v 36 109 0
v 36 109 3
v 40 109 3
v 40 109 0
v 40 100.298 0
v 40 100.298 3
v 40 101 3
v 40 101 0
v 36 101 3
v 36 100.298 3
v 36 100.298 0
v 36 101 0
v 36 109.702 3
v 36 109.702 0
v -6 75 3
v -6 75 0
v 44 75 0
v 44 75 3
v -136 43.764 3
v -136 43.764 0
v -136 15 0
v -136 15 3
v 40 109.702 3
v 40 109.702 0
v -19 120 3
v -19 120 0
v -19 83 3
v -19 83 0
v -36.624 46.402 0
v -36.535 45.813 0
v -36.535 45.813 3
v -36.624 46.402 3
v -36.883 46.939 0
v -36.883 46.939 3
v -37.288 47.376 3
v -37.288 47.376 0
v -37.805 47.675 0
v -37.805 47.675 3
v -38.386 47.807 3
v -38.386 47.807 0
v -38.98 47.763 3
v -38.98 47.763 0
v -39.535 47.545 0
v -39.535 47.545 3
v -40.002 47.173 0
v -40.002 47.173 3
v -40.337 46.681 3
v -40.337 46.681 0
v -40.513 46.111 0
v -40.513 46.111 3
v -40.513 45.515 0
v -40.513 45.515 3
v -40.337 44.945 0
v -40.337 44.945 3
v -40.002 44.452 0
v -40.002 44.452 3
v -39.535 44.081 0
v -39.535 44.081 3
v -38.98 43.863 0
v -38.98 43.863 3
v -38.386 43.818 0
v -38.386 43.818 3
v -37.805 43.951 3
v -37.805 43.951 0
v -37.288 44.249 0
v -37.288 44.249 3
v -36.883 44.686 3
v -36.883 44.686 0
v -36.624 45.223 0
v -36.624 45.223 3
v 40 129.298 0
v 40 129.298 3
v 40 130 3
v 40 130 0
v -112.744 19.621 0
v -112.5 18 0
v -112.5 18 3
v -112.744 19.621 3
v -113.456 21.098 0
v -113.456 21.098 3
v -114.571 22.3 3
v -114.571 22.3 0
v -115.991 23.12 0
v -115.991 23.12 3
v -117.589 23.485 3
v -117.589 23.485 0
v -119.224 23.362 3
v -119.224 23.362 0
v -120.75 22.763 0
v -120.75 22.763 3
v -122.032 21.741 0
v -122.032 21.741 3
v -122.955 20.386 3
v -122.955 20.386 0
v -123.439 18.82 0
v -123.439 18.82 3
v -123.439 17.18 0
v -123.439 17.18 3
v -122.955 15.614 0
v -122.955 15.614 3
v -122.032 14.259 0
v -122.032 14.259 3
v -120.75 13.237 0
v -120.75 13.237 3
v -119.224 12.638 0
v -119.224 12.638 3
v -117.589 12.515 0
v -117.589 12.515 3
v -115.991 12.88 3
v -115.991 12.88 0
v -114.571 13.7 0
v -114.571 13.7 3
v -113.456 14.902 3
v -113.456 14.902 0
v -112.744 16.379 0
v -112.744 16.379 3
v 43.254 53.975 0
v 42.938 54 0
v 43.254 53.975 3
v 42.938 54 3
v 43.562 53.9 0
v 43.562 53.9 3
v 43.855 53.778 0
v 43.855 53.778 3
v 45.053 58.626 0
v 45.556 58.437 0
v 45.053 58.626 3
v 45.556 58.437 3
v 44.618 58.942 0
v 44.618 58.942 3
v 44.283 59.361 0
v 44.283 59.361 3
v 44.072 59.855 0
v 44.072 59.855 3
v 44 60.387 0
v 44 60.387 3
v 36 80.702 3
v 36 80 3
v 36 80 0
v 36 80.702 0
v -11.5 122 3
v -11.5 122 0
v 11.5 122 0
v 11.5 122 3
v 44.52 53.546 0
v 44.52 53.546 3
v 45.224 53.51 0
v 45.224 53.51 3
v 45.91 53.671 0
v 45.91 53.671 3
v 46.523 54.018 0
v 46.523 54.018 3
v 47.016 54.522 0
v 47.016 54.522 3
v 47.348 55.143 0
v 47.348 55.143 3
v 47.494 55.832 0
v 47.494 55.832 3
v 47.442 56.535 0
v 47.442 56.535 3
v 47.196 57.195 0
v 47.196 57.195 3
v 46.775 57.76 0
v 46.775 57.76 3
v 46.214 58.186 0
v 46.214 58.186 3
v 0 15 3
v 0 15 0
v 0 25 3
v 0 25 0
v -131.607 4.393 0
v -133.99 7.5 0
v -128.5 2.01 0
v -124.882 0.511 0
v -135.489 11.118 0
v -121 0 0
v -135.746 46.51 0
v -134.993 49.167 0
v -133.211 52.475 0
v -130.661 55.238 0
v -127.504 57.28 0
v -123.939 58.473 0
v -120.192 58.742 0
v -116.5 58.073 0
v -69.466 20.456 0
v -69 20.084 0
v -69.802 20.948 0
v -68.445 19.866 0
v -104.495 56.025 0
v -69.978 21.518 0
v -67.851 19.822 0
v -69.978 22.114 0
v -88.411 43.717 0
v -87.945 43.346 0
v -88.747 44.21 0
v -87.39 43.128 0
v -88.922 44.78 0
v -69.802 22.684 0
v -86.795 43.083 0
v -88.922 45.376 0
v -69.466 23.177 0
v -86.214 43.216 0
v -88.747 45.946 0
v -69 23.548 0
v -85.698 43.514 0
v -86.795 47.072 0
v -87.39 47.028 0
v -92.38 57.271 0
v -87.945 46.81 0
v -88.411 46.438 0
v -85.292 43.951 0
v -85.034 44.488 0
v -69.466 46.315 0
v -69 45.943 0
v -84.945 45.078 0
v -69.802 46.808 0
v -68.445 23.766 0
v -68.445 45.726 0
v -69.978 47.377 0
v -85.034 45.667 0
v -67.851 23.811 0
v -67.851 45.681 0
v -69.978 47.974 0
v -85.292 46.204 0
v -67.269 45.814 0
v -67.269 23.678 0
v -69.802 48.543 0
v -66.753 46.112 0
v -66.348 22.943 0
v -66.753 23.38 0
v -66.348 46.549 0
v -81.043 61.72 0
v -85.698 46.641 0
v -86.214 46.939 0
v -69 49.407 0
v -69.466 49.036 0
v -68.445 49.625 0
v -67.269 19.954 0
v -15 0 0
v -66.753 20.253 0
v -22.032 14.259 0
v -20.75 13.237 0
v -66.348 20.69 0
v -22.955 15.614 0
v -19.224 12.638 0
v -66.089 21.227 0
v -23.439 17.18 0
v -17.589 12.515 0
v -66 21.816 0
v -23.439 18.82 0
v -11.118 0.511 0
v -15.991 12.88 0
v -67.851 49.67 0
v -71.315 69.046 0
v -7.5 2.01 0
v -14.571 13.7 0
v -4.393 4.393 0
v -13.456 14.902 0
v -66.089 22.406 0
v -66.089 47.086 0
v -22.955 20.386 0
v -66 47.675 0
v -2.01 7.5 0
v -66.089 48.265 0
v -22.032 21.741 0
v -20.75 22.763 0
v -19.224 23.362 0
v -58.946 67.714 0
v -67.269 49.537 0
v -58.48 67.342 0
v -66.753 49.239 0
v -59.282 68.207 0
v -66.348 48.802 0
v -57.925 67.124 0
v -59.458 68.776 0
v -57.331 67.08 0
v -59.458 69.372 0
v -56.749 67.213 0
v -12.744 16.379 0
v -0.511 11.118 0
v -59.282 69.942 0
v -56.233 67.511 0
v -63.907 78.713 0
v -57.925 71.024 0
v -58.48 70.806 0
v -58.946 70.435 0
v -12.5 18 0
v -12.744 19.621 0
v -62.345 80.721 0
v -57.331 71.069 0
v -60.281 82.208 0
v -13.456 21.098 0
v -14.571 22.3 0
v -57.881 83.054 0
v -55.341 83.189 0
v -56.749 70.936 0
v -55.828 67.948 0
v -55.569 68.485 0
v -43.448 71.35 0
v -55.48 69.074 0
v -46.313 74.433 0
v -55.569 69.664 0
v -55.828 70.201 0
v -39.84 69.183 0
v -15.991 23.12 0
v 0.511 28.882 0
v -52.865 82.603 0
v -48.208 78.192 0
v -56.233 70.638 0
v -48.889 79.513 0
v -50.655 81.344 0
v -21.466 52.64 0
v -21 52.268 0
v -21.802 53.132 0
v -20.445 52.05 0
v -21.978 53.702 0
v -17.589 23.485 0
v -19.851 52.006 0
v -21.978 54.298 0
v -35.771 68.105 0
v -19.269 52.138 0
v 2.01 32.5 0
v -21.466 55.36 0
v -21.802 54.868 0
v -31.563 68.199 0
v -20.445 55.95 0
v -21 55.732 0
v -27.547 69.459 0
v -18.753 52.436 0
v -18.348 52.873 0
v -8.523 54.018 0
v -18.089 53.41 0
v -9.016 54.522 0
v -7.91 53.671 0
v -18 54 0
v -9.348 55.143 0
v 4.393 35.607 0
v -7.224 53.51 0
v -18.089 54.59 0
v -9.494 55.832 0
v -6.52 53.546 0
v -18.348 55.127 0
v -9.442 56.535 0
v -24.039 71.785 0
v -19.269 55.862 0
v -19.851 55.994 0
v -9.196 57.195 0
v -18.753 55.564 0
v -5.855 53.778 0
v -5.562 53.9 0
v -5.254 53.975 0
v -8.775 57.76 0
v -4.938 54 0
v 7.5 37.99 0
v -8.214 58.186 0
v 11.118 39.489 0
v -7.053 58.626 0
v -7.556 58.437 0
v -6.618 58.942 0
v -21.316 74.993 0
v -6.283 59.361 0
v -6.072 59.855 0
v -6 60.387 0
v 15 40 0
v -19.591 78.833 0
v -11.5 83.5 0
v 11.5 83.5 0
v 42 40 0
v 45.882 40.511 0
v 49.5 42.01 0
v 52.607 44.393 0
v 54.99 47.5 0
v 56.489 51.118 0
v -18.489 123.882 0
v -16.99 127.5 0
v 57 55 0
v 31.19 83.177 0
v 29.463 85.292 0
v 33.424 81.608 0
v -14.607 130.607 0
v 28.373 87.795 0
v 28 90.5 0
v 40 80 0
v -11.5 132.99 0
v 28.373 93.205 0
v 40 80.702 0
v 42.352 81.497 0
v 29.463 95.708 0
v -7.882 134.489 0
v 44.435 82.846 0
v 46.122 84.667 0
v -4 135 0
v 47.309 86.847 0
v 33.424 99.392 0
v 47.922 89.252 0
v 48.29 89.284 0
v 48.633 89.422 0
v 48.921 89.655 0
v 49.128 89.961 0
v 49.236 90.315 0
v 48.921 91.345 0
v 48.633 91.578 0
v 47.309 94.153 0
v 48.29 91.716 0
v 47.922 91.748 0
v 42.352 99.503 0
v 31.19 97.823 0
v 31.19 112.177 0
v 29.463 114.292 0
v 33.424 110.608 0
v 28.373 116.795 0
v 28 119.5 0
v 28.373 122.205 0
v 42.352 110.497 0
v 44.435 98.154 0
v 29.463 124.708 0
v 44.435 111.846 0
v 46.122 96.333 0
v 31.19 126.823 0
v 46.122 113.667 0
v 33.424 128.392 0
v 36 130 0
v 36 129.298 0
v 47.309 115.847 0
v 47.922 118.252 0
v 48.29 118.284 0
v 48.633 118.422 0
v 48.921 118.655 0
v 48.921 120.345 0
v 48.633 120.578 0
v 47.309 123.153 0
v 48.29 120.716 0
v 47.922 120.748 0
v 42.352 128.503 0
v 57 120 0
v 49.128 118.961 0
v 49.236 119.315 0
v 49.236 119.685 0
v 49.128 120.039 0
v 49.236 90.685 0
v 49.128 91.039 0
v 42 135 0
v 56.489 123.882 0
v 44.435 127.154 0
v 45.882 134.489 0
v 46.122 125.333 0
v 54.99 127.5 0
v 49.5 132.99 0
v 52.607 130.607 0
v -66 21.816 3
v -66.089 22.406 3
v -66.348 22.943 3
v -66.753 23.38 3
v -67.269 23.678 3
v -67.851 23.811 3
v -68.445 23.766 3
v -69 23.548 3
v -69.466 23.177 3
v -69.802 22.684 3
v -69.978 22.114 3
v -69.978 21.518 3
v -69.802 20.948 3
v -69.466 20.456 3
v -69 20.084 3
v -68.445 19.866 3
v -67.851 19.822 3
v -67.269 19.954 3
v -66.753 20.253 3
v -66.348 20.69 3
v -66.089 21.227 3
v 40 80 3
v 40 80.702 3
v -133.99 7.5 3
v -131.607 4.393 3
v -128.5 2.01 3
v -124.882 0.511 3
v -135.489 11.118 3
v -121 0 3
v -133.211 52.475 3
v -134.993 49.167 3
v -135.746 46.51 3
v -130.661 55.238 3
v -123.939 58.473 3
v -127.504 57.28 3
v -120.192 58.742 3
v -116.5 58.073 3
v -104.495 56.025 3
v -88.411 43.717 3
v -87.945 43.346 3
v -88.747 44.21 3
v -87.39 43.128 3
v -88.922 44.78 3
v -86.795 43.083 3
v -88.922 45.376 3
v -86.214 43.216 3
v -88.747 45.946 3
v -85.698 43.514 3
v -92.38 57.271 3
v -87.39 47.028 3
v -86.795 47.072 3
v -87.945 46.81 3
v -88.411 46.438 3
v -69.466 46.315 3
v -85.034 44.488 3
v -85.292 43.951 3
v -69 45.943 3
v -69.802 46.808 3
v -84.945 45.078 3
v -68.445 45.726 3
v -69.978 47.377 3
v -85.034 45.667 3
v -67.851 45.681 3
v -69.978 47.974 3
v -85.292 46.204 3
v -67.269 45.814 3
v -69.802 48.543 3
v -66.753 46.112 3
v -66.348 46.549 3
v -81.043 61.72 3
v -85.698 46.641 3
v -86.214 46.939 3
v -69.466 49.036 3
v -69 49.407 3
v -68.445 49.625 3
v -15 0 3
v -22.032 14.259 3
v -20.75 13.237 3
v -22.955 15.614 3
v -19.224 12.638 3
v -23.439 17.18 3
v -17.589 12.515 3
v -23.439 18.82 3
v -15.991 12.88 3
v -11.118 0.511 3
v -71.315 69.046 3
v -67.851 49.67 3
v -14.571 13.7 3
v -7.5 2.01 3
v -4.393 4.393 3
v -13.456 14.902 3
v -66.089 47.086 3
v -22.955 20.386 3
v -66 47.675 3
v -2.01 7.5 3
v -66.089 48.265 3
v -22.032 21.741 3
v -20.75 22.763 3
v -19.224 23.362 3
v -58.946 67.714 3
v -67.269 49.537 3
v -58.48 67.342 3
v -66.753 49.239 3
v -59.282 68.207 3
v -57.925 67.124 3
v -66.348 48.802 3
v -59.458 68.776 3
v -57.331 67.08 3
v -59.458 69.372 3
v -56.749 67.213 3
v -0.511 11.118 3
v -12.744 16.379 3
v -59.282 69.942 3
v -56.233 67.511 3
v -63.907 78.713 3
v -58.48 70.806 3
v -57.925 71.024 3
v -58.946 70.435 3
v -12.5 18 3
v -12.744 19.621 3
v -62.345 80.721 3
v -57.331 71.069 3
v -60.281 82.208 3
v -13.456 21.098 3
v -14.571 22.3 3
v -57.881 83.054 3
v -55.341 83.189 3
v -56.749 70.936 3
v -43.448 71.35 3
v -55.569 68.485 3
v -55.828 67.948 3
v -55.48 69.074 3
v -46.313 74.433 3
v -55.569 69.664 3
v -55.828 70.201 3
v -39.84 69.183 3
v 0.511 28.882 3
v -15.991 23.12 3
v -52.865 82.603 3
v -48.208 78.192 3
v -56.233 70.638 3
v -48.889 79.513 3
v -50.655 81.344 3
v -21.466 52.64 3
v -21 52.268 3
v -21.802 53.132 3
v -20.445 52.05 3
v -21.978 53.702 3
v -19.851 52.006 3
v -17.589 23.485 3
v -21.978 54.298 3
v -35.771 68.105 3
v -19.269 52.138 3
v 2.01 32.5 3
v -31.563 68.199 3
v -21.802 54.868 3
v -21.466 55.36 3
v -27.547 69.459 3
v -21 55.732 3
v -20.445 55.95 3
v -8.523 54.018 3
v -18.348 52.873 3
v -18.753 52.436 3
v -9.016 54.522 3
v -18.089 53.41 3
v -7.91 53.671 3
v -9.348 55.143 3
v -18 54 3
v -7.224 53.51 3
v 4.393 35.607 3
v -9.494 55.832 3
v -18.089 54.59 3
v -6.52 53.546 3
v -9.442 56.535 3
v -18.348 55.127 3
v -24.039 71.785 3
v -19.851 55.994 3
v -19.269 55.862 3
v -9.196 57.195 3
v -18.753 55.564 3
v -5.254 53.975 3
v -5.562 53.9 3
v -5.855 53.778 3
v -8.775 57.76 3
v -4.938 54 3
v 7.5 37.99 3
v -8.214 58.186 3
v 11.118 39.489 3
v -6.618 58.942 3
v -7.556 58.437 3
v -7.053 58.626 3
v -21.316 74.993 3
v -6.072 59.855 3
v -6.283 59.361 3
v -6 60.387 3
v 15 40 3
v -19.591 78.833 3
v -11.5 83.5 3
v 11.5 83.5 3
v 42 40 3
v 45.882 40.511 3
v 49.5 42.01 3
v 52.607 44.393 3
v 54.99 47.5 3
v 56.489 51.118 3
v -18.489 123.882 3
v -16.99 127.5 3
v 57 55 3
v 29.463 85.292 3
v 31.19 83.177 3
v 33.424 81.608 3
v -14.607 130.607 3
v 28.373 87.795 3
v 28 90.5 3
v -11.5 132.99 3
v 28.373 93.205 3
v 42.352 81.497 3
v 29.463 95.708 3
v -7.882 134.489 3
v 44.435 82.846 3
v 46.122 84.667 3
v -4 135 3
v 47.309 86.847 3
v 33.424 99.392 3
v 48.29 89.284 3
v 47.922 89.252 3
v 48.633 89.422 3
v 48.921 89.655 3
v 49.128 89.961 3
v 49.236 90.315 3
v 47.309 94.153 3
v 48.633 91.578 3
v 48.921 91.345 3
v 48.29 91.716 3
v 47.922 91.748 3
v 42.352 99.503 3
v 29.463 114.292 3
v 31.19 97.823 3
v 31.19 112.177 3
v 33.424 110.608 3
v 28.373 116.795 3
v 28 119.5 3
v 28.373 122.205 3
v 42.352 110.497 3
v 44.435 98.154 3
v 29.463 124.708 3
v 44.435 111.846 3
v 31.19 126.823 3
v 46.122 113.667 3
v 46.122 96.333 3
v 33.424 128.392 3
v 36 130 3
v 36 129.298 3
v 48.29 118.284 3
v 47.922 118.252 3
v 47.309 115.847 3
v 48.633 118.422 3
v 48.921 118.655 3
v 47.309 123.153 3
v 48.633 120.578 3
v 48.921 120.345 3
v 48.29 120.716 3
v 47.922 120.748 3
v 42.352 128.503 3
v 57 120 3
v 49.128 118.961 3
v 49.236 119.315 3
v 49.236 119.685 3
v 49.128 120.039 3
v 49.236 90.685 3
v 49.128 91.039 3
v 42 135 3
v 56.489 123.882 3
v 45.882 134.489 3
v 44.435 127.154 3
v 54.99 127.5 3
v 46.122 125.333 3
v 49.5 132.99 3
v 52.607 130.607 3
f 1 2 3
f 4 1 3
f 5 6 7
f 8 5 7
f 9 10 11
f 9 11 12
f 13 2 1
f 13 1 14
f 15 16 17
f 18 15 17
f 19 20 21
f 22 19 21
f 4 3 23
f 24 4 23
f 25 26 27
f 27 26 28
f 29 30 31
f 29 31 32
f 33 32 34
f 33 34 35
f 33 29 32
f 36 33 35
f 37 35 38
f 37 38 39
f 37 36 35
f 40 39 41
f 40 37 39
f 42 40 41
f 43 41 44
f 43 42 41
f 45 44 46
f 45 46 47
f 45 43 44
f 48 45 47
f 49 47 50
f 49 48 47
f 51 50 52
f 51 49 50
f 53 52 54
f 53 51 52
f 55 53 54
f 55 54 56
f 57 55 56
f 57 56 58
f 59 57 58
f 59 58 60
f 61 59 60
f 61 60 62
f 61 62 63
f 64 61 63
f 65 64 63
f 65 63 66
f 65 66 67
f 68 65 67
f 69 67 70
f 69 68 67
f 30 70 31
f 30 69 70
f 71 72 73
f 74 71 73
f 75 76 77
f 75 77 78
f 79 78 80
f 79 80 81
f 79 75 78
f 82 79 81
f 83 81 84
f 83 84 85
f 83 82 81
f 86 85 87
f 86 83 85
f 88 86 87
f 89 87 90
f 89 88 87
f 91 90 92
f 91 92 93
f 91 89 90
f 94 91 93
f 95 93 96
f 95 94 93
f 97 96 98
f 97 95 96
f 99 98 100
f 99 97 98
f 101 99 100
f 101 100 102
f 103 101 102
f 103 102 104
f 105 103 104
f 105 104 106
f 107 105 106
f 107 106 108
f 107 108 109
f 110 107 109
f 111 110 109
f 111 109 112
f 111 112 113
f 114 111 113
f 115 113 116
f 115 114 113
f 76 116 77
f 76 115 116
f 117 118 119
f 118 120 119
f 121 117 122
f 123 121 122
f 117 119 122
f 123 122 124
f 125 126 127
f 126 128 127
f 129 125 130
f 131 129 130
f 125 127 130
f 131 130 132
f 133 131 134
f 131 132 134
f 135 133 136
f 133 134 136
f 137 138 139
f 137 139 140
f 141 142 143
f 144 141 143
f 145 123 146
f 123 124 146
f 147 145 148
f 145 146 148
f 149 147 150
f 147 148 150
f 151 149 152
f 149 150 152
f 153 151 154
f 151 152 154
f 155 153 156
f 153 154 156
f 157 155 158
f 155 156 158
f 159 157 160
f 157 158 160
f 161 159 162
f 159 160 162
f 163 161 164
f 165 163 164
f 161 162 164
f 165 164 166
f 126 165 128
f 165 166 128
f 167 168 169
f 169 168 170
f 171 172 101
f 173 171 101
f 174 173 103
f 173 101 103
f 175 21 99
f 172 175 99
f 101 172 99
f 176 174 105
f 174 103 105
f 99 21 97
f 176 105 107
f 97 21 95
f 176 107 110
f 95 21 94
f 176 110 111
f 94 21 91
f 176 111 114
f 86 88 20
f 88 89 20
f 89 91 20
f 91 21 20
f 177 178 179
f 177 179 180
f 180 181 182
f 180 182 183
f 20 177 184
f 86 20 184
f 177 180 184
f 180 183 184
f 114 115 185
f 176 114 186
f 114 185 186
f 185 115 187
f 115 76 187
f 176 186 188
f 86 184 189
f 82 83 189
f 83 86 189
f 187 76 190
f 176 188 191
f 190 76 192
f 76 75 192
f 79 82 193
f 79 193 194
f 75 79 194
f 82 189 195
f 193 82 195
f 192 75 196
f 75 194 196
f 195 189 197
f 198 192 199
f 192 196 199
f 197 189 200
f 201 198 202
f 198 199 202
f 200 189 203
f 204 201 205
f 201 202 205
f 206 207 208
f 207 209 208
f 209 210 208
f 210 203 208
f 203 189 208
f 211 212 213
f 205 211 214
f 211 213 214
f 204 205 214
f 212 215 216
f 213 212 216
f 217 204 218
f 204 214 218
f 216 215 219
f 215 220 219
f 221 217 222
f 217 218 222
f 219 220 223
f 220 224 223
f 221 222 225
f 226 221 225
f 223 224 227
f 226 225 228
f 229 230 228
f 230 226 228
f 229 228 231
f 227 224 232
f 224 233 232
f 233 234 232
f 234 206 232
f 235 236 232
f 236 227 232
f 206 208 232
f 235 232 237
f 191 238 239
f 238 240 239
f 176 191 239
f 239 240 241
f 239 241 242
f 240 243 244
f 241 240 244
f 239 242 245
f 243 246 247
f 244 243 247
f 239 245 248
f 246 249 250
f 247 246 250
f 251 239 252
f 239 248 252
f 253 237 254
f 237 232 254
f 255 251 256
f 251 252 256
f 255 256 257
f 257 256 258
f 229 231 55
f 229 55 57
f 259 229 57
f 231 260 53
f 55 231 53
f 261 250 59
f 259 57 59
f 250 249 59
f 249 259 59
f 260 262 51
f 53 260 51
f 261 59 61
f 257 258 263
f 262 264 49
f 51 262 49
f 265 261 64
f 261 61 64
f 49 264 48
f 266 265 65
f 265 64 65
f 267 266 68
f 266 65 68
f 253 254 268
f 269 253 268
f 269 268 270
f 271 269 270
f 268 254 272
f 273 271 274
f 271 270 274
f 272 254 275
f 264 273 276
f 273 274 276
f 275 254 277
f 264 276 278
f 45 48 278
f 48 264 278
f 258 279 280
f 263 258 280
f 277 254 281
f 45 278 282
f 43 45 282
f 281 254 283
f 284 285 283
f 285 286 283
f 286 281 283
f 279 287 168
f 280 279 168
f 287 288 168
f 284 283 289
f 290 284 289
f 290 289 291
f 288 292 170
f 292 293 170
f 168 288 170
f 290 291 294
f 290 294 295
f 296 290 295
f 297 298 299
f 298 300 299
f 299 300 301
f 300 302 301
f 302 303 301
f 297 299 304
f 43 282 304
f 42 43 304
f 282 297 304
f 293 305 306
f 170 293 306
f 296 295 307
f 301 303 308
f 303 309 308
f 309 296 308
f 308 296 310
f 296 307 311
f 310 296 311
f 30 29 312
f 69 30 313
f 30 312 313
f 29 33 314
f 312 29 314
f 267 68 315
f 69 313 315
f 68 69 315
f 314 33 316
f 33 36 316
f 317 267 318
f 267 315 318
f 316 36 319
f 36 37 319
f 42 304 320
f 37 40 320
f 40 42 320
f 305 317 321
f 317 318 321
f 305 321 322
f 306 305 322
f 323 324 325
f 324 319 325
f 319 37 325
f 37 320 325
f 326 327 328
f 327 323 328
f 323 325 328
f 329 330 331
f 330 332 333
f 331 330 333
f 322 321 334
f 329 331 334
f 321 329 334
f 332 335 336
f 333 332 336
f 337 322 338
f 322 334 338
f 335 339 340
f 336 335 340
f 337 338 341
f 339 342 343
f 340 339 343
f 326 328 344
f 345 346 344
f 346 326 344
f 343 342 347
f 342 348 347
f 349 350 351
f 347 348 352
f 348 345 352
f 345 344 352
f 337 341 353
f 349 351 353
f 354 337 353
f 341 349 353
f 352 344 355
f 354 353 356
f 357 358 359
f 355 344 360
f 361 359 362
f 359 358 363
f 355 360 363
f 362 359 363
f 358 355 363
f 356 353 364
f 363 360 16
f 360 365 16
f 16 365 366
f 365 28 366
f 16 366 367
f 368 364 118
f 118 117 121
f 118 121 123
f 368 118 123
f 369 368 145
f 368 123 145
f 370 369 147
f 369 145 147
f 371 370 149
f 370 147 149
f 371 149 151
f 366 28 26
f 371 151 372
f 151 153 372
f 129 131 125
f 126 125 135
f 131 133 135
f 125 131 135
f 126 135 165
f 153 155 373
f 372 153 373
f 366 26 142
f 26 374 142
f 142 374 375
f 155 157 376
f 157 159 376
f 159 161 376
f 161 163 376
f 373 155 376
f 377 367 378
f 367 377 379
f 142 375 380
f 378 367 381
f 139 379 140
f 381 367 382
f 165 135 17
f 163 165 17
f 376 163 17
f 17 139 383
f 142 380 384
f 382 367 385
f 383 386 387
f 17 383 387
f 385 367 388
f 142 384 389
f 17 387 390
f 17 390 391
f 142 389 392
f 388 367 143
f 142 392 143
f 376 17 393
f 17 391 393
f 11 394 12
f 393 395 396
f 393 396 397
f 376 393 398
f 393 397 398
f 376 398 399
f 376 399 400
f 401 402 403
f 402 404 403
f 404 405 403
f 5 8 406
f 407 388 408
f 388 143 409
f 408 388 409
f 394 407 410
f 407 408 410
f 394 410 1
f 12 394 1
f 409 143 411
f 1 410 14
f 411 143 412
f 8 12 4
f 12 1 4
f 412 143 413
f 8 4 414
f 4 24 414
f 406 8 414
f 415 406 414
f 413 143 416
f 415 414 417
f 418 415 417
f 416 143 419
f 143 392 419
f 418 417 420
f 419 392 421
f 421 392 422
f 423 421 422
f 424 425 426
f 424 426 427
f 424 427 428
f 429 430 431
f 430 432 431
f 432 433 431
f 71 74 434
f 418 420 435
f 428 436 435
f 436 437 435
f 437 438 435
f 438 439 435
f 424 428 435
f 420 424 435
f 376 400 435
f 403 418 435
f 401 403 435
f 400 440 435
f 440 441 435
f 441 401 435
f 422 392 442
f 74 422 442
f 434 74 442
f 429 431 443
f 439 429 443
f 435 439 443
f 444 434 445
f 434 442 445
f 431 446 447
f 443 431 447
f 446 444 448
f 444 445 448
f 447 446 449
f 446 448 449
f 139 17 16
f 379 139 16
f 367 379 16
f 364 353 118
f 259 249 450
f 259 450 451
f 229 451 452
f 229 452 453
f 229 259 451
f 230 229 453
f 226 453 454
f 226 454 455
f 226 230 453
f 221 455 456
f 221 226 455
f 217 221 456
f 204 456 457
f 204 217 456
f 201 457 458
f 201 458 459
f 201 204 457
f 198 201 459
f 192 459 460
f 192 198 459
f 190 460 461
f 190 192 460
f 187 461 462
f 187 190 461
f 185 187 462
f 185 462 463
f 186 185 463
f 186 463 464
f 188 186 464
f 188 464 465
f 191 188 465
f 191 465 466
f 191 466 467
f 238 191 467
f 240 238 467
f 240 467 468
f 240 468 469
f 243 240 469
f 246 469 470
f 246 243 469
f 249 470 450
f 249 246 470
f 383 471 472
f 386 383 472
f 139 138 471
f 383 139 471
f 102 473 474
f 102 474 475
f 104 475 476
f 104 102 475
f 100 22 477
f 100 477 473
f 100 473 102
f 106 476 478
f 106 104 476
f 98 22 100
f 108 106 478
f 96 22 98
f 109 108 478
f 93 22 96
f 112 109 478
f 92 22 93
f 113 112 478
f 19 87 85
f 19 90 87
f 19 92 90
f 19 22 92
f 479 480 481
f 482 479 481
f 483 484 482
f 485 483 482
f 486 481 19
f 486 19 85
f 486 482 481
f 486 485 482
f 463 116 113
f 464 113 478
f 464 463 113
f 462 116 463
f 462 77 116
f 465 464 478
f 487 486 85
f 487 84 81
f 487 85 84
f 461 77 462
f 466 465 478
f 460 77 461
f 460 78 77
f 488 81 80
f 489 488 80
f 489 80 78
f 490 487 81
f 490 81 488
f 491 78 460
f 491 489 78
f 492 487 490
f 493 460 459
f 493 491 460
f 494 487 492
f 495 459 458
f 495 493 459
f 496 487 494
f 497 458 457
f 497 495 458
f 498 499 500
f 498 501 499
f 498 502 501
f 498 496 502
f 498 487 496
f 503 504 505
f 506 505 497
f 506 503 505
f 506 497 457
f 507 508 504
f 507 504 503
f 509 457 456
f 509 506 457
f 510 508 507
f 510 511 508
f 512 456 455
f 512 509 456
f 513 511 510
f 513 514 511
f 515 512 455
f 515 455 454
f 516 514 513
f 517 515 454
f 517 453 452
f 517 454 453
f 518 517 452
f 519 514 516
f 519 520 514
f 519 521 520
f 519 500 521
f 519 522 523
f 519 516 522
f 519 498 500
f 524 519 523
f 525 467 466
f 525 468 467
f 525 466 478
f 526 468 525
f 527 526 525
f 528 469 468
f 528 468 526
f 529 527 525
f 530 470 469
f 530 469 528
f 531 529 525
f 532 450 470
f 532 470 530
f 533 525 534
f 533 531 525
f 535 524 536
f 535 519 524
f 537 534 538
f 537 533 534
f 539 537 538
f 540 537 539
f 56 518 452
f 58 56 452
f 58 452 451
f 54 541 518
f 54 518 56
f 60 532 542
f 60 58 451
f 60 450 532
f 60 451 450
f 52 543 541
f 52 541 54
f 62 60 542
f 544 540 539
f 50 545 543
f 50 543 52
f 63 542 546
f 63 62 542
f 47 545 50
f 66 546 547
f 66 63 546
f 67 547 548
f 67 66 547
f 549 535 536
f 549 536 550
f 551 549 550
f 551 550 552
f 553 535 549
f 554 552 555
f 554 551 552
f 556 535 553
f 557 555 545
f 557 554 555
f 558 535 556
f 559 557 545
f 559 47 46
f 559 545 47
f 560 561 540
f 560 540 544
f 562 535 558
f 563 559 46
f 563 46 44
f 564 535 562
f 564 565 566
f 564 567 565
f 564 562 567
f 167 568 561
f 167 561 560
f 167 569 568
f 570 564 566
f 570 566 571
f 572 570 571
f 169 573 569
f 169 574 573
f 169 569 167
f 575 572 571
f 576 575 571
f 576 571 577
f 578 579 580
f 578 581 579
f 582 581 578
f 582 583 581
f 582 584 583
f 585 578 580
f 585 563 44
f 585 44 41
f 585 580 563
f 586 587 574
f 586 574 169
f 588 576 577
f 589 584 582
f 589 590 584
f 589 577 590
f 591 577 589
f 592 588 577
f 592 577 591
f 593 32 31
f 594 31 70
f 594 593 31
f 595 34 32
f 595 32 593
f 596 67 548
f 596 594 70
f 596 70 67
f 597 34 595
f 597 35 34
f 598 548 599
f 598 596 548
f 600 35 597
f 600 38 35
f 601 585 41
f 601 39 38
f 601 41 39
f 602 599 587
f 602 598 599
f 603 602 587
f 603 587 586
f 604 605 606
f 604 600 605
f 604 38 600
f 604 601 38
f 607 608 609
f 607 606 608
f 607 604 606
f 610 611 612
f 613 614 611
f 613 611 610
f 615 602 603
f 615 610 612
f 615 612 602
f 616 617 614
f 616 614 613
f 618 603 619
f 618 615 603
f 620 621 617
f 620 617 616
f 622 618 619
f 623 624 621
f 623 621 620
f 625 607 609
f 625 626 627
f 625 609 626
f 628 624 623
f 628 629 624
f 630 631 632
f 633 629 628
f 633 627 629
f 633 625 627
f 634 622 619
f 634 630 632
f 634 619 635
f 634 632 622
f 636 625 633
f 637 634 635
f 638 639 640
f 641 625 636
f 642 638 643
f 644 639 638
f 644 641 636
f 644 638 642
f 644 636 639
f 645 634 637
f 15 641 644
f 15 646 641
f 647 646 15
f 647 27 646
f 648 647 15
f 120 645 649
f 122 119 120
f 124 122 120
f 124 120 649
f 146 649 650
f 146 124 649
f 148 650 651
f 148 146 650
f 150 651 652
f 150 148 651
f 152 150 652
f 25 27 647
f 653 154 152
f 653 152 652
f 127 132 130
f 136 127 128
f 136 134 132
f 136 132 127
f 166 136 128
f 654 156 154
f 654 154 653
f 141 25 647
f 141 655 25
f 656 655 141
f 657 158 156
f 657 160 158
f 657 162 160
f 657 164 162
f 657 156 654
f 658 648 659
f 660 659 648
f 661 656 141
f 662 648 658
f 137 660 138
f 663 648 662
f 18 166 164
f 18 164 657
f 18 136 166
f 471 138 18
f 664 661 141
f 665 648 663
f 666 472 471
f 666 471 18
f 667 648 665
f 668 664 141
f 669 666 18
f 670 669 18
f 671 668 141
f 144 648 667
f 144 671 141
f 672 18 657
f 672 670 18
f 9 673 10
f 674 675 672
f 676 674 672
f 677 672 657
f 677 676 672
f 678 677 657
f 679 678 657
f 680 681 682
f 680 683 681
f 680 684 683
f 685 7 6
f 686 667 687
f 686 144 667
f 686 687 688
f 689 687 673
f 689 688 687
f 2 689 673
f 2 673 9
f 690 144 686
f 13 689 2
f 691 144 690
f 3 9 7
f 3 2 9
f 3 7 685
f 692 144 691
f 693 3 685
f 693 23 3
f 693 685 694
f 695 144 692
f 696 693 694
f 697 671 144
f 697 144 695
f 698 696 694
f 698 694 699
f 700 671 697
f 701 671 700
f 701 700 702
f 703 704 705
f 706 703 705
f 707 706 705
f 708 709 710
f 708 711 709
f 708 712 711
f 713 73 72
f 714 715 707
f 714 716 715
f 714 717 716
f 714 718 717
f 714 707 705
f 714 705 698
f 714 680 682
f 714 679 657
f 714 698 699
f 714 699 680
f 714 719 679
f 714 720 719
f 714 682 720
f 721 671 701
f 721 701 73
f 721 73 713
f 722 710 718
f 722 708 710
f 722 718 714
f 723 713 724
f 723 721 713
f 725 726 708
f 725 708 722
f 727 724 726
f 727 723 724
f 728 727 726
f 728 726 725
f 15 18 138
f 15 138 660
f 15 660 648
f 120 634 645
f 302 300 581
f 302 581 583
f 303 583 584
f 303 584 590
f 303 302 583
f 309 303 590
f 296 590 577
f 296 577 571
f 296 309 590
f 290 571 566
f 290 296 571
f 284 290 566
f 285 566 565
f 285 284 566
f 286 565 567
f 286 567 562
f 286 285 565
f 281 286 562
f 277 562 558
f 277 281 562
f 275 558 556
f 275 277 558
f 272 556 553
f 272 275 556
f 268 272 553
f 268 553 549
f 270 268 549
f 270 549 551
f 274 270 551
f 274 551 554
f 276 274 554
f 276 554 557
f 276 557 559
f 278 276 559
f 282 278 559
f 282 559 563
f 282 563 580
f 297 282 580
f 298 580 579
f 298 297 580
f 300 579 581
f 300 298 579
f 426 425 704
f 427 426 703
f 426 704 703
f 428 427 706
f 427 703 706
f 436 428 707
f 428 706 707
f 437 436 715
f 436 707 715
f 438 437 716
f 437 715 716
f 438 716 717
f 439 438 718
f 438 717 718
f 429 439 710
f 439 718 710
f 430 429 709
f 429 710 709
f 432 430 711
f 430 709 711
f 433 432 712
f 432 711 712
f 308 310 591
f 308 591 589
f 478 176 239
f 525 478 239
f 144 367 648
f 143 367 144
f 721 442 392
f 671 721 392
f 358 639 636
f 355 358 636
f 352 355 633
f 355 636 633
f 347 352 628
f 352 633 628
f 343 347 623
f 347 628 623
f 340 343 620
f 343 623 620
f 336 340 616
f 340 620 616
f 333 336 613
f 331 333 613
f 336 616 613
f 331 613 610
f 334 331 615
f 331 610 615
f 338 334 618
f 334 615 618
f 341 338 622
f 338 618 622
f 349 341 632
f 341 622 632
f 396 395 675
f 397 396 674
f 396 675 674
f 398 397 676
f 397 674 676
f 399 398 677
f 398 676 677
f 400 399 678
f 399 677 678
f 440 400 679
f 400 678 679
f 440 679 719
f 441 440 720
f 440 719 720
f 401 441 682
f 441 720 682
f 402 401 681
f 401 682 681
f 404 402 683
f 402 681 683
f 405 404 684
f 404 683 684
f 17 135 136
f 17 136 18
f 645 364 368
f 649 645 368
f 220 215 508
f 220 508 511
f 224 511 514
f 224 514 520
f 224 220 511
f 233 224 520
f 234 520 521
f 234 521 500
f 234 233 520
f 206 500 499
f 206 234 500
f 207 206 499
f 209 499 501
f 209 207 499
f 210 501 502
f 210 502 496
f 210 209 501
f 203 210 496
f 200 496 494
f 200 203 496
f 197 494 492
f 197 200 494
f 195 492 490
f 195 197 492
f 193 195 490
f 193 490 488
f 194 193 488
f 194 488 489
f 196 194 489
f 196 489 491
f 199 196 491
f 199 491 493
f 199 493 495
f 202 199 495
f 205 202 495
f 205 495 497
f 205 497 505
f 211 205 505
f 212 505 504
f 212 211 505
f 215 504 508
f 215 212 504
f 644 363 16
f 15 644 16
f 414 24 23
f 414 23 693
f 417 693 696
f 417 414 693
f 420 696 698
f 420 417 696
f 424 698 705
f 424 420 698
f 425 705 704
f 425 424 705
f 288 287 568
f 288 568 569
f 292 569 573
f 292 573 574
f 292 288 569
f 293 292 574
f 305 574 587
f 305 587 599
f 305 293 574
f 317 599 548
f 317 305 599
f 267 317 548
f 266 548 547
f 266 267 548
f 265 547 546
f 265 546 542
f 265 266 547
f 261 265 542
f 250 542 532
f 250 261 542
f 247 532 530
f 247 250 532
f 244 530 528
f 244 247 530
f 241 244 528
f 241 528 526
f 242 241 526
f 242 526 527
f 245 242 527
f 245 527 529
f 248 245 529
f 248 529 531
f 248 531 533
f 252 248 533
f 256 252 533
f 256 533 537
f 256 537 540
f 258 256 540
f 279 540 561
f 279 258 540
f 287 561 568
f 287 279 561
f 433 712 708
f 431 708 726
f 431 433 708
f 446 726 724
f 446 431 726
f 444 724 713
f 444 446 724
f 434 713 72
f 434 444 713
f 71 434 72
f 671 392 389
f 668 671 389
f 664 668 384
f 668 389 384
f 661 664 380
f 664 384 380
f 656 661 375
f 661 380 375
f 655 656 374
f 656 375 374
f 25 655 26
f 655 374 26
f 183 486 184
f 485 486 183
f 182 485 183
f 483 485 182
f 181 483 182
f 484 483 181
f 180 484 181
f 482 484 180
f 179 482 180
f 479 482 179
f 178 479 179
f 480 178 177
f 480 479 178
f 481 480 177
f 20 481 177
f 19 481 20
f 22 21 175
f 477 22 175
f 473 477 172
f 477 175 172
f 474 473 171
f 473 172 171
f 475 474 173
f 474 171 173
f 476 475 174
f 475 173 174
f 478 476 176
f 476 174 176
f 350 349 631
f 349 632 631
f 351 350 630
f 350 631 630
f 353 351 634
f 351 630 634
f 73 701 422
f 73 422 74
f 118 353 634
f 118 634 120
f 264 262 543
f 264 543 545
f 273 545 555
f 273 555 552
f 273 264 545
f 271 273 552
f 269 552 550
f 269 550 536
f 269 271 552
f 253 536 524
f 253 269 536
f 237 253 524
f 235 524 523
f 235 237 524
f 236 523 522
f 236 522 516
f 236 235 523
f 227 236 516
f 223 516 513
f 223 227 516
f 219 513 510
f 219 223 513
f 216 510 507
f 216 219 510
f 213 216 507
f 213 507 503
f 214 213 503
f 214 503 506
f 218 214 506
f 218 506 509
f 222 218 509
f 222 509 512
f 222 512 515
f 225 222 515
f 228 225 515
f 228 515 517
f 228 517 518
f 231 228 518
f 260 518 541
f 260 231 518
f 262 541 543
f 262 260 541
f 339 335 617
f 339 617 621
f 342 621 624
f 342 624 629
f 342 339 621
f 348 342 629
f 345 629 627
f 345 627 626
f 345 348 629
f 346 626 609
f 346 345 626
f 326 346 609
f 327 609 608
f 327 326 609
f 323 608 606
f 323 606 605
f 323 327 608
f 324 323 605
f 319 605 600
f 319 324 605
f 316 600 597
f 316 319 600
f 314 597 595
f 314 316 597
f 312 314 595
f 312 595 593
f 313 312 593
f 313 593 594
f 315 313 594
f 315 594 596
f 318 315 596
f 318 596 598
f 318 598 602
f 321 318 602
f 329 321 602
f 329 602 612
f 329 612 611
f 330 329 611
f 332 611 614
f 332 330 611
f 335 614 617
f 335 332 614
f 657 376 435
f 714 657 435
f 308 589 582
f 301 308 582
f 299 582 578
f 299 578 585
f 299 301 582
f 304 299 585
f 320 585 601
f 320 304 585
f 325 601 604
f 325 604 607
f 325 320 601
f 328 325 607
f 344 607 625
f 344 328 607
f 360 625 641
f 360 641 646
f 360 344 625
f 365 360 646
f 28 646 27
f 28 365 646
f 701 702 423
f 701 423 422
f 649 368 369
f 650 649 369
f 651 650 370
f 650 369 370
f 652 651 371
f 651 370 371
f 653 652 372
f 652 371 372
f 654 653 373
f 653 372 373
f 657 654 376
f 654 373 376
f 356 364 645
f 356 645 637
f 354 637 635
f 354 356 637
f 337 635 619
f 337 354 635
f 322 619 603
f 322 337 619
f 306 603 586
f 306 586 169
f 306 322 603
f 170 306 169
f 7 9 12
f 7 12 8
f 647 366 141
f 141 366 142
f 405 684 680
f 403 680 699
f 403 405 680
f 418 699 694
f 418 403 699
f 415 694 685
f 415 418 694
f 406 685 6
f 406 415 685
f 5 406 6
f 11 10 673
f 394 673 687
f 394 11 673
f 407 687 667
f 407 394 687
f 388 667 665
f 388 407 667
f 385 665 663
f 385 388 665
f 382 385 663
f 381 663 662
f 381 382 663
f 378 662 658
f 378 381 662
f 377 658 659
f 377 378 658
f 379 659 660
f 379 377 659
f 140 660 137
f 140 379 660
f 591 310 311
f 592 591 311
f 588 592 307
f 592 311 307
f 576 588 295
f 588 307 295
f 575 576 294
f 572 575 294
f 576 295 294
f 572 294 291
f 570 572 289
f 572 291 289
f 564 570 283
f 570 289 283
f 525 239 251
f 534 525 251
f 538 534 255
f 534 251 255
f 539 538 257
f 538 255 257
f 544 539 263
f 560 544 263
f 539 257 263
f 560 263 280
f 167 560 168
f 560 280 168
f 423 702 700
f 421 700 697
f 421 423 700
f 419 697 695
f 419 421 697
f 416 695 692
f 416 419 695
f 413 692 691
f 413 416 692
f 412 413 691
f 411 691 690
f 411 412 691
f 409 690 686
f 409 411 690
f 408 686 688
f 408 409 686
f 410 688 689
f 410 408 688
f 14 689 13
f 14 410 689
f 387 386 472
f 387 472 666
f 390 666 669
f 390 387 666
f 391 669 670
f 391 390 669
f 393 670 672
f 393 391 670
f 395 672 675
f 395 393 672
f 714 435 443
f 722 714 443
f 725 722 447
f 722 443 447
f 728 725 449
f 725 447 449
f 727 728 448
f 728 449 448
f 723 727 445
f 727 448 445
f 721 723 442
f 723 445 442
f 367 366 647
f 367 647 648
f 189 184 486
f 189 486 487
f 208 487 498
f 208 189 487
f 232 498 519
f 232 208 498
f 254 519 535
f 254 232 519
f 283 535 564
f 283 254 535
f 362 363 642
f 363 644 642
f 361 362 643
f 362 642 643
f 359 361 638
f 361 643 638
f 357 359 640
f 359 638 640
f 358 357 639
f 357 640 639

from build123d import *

# Parameters (mm, degrees)
SKETCH_R        = 5.5
SKETCH_R_2      = 10
SKETCH_R_3      = 2
SKETCH_W        = 50
SKETCH_H        = 21
SKETCH_W_2      = 23
SKETCH_H_2      = 38.5
PAD_DEPTH       = 3
FILLET_R        = 5
FILLET001_R     = 15
SKETCH001_R     = 1.25
SKETCH001_R_2   = 2.5
POCKET_DEPTH    = 3.001
FILLET002_R     = 2
FILLET003_R     = 2
SKETCH002_W     = 4
SKETCH002_H     = 21
POCKET001_DEPTH = 3.001


with BuildPart() as part:
    # Sketch → Pad (new body)
    with BuildSketch(Plane.XY):
        with BuildLine():
            Line((0, 15), (0, 25))
            ThreePointArc((15, 40), (4.393398, 35.606602), (0, 25))
            Line((15, 40), (42, 40))
            ThreePointArc((42, 40), (52.606602, 44.393398), (57, 55))
            Line((57, 55), (57, 120))
            ThreePointArc((57, 120), (52.606602, 130.606602), (42, 135))
            Line((42, 135), (-4, 135))
            ThreePointArc((-4, 135), (-14.606602, 130.606602), (-19, 120))
            Line((-19, 120), (-19, 83))
            ThreePointArc((-48.374211, 78.71257), (-31.833571, 68.157272), (-19, 83))
            ThreePointArc((-48.374211, 78.71257), (-56.140556, 83.224713), (-63.9069, 78.71257))
            ThreePointArc((-130, 65), (-93.858369, 56.938332), (-63.9069, 78.71257))
            ThreePointArc((-130, 65), (-134.416408, 59.708204), (-136, 53))
            Line((-136, 53), (-136, 15))
            ThreePointArc((-136, 15), (-131.606602, 4.393398), (-121, 0))
            Line((-121, 0), (-15, 0))
            ThreePointArc((-15, 0), (-4.393398, 4.393398), (0, 15))
        make_face()
        with Locations((-118, 18)):
            Circle(SKETCH_R, mode=Mode.SUBTRACT)
        with Locations((-18, 18)):
            Circle(SKETCH_R, mode=Mode.SUBTRACT)
        with Locations((38, 119.5)):
            Circle(SKETCH_R_2, mode=Mode.SUBTRACT)
        with Locations((38, 90.5)):
            Circle(SKETCH_R_2, mode=Mode.SUBTRACT)
        with Locations((-86.944694, 45.077738)):
            Circle(SKETCH_R_3, mode=Mode.SUBTRACT)
        with Locations((-57.480095, 69.07435)):
            Circle(SKETCH_R_3, mode=Mode.SUBTRACT)
        with Locations((-38.535401, 45.812824)):
            Circle(SKETCH_R_3, mode=Mode.SUBTRACT)
        with Locations((-68, 21.816212)):
            Circle(SKETCH_R_3, mode=Mode.SUBTRACT)
        with Locations((-68, 47.675445)):
            Circle(SKETCH_R_3, mode=Mode.SUBTRACT)
        with Locations((-20, 54)):
            Circle(SKETCH_R_3, mode=Mode.SUBTRACT)
        with Locations((19, 64.5)):
            Rectangle(SKETCH_W, SKETCH_H, mode=Mode.SUBTRACT)
        with Locations((0, 102.75)):
            Rectangle(SKETCH_W_2, SKETCH_H_2, mode=Mode.SUBTRACT)
    extrude(amount=PAD_DEPTH)

    # Fillet
    fillet_edges = [part.edges().sort_by_distance(p)[0] for p in [
        (-48.374211, 78.71257, 1.5),
    ]]
    fillet(fillet_edges, radius=FILLET_R)

    # Fillet001
    fillet001_edges = [part.edges().sort_by_distance(p)[0] for p in [
        (-130, 65, 1.5),
    ]]
    fillet(fillet001_edges, radius=FILLET001_R)

    # Sketch001 (on Face38 of Fillet001) → Pocket (cut, through all)
    with BuildSketch(Plane.XY.offset(3)):
        with Locations((48, 119.5)):
            Circle(SKETCH001_R)
        with Locations((48, 90.5)):
            Circle(SKETCH001_R)
        with Locations((-7, 56)):
            Circle(SKETCH001_R_2)
        with Locations((45, 56)):
            Circle(SKETCH001_R_2)
    extrude(amount=-POCKET_DEPTH, mode=Mode.SUBTRACT)

    # Fillet002
    fillet002_edges = [part.edges().sort_by_distance(p)[0] for p in [
        (44, 58.291288, 1.5),
        (-6, 58.291288, 1.5),
    ]]
    fillet(fillet002_edges, radius=FILLET002_R)

    # Fillet003
    fillet003_edges = [part.edges().sort_by_distance(p)[0] for p in [
        (-5.5, 54, 1.5),
        (43.5, 54, 1.5),
    ]]
    fillet(fillet003_edges, radius=FILLET003_R)

    # Sketch002 (on Face46 of Fillet003) → Pocket001 (cut, through all)
    with BuildSketch(Plane.XY.offset(3)):
        with Locations((38, 119.5)):
            Rectangle(SKETCH002_W, SKETCH002_H)
        with Locations((38, 90.5)):
            Rectangle(SKETCH002_W, SKETCH002_H)
    extrude(amount=-POCKET001_DEPTH, mode=Mode.SUBTRACT)


solid = part.part
